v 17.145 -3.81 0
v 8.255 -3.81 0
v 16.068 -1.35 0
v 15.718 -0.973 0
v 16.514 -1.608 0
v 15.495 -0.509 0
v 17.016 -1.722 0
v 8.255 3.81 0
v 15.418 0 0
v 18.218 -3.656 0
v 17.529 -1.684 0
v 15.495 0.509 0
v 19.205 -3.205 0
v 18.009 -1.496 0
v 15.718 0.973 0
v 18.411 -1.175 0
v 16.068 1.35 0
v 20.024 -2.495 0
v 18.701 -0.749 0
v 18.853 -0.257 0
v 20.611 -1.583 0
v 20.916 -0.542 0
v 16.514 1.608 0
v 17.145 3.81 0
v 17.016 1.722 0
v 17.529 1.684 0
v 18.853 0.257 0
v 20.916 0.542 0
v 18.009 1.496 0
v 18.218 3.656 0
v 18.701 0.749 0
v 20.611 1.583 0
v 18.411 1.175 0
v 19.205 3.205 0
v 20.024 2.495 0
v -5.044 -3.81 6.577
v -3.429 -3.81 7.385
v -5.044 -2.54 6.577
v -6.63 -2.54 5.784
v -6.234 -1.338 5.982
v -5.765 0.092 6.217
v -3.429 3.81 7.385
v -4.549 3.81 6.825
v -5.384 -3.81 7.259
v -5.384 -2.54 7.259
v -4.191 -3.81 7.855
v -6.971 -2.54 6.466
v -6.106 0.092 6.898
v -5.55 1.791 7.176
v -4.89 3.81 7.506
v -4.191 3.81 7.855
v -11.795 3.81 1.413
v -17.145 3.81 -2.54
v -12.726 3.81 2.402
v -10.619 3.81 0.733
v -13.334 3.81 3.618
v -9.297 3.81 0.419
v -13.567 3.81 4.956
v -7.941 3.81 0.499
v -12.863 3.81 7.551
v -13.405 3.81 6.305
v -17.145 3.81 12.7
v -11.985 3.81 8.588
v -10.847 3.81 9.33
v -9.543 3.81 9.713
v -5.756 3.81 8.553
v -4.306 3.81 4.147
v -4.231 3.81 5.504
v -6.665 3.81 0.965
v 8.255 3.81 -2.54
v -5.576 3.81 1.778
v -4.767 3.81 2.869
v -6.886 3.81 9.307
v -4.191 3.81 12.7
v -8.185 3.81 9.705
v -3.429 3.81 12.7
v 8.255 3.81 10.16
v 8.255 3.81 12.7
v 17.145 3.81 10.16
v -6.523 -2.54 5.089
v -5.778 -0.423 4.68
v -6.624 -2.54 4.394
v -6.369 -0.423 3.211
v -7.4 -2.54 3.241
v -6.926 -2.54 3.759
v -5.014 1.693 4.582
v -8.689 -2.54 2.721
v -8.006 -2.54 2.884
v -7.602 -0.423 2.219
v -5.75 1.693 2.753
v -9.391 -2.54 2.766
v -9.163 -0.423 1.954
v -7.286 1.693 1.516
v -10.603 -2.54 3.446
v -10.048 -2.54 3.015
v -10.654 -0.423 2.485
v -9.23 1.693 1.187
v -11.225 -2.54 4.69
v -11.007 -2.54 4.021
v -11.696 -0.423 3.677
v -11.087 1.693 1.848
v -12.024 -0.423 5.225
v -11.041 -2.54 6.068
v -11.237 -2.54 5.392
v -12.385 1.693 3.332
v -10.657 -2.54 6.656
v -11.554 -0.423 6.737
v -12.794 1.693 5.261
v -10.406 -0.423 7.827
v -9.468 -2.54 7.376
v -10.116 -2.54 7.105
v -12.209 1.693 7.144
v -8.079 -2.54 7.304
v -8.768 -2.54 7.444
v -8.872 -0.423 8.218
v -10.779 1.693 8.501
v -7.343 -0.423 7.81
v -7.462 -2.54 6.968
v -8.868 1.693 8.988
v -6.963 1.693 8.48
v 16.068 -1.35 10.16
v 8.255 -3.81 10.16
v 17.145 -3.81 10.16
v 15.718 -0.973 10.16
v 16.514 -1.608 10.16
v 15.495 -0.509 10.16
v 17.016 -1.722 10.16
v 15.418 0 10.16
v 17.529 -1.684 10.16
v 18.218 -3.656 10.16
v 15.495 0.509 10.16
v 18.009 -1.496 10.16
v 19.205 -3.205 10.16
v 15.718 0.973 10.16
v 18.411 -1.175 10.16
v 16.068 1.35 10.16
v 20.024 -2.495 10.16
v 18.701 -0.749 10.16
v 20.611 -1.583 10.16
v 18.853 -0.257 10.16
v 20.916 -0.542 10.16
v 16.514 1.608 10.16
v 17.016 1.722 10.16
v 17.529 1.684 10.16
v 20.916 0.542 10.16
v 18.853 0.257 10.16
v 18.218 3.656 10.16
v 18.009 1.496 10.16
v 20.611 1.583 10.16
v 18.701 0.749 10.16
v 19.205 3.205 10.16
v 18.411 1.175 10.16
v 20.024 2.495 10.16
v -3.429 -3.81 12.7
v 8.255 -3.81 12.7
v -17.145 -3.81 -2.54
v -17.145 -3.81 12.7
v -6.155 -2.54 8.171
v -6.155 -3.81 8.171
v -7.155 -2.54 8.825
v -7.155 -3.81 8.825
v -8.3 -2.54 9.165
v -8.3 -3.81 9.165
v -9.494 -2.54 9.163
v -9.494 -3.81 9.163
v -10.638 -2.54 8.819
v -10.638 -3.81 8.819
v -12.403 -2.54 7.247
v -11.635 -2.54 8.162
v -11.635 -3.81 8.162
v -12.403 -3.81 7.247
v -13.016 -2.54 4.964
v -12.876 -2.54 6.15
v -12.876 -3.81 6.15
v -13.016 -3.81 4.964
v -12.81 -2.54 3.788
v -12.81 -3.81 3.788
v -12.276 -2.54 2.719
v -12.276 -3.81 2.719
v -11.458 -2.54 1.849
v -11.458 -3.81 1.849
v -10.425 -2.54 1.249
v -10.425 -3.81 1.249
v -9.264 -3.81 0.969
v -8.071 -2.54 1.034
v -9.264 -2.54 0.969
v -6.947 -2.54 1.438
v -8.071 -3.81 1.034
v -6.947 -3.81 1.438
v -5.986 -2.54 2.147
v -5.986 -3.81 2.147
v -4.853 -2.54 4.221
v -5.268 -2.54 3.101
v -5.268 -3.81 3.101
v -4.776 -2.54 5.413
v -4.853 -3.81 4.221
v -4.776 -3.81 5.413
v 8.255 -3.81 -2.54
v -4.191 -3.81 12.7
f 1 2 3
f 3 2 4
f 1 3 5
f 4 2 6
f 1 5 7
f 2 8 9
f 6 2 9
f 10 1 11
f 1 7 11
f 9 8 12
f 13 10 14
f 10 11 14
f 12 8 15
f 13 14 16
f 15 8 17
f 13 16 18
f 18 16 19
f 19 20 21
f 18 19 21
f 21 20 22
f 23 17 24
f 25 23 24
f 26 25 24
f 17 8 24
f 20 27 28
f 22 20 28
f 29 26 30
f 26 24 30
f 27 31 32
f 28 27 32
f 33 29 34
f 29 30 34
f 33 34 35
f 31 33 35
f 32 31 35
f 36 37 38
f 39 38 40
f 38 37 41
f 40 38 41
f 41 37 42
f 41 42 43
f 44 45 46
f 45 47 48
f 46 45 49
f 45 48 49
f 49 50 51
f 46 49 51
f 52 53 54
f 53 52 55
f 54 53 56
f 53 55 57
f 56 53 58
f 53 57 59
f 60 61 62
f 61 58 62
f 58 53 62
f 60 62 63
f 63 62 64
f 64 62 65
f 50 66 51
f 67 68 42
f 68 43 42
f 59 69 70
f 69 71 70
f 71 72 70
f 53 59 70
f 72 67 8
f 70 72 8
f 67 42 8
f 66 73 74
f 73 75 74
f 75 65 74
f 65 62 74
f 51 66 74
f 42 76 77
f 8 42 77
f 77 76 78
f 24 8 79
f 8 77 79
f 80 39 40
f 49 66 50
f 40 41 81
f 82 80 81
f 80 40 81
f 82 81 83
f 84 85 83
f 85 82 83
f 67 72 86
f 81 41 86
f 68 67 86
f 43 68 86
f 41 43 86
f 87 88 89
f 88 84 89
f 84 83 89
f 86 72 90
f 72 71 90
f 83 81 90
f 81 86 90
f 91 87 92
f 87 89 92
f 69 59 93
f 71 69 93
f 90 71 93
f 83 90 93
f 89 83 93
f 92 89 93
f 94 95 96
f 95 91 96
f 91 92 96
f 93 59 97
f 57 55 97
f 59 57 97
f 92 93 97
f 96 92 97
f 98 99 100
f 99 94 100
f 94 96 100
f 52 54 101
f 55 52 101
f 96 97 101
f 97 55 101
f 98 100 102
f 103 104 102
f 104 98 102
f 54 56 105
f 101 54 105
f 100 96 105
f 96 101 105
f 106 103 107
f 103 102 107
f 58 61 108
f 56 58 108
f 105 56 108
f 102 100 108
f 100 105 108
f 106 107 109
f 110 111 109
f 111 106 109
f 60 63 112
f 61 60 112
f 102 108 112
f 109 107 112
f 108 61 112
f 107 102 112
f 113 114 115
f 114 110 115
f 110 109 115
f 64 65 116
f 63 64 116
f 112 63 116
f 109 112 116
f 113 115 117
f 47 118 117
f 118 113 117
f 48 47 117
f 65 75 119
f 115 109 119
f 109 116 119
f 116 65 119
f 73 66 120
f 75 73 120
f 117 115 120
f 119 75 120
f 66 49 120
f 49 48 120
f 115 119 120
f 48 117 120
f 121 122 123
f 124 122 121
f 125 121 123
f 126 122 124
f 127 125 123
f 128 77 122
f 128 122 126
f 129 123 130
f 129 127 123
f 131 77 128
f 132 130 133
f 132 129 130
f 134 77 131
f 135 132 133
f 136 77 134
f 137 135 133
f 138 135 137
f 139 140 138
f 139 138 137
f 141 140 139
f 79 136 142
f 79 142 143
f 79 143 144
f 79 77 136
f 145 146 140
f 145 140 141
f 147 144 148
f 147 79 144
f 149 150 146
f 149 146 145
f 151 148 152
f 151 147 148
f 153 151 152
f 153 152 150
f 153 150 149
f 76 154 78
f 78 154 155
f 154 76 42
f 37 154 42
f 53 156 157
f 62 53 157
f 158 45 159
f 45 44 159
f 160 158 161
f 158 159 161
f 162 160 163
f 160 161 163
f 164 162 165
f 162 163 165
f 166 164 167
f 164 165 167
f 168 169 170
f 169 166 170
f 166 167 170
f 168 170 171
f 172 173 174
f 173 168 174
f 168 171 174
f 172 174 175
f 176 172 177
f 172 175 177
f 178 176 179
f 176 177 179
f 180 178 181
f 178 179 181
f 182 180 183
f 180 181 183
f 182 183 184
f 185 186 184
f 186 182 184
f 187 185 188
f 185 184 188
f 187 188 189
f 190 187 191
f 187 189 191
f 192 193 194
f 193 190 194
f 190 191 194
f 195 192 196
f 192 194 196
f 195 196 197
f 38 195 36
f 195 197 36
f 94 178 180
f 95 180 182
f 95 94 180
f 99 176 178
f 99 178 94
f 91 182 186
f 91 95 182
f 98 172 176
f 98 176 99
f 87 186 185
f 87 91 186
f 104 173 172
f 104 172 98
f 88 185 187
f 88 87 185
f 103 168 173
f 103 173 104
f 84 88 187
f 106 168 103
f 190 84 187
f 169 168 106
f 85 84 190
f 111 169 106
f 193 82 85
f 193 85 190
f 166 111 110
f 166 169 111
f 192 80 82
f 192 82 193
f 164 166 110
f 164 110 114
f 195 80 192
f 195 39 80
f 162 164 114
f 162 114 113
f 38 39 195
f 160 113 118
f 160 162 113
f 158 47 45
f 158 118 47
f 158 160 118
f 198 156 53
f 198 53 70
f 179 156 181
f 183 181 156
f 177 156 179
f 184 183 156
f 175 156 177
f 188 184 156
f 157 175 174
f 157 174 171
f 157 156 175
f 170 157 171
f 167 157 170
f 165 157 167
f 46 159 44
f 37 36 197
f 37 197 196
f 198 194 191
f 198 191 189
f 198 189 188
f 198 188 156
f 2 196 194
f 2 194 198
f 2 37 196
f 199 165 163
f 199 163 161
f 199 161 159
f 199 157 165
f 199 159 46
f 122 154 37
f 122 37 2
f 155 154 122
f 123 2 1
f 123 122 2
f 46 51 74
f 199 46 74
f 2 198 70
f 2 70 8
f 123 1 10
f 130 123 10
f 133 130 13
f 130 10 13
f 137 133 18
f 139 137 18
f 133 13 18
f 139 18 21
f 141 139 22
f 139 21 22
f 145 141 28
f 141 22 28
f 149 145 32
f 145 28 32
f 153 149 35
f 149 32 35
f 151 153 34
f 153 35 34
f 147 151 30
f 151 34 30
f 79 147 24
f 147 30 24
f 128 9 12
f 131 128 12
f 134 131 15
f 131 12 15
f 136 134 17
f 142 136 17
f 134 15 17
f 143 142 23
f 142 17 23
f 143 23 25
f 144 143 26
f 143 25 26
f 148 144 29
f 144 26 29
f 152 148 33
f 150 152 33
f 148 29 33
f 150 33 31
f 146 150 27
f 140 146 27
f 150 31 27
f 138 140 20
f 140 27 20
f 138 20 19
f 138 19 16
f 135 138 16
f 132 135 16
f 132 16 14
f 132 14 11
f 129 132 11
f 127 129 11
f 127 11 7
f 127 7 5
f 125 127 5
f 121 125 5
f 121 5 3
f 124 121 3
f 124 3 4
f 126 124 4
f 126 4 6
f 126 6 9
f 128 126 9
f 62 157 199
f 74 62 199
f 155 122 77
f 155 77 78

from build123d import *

# Parameters (mm, degrees)
BOSS_EXTRUDE1_DEPTH   = 10.16
F_4_CLEARANCE_HOLE1_D = 3.4544
SKETCH4_R             = 1.905
CUT_EXTRUDE1_DEPTH    = 8.62
CUT_EXTRUDE1_TAPER    = -20
SKETCH5_R             = 4.1275
CUT_EXTRUDE2_DEPTH    = 1.27
SKETCH6_W             = 25.4
SKETCH6_H             = 2.54
BOSS_EXTRUDE2_DEPTH   = 7.62
CUT_EXTRUDE3_DEPTH    = 8.62


with BuildPart() as part:
    # Sketch1 → Boss-Extrude1 (new body)
    with BuildSketch(Plane.XY):
        with BuildLine():
            Line((-17.145, -3.81), (17.145, -3.81))
            ThreePointArc((17.145, -3.81), (20.955, 0), (17.145, 3.81))
            Line((17.145, 3.81), (-17.145, 3.81))
            Line((-17.145, 3.81), (-17.145, -3.81))
        make_face()
    extrude(amount=BOSS_EXTRUDE1_DEPTH)

    # #4 Clearance Hole1 (through all)
    with Locations(Plane.XY.offset(10.16)):
        with Locations((17.145, 0)):
            Hole(F_4_CLEARANCE_HOLE1_D / 2)

    # Sketch4 → Cut-Extrude1 (cut, through all)
    with BuildSketch(Plane(origin=(0, -3.81, 0), x_dir=(1, 0, 0), z_dir=(0, 1, 0))):
        with Locations((-8.89, -5.08)):
            Circle(SKETCH4_R)
    extrude(amount=CUT_EXTRUDE1_DEPTH, taper=CUT_EXTRUDE1_TAPER, mode=Mode.SUBTRACT)

    # Sketch5 → Cut-Extrude2 (cut)
    with BuildSketch(Plane.XZ.offset(3.81)):
        with Locations((-8.89, 5.08)):
            Circle(SKETCH5_R)
    extrude(amount=-CUT_EXTRUDE2_DEPTH, mode=Mode.SUBTRACT)

    # Sketch6 → Boss-Extrude2 (add, through all)
    with BuildSketch(Plane.XZ.offset(3.81)):
        with Locations((-4.445, 11.43)):
            Rectangle(SKETCH6_W, SKETCH6_H)
        with Locations((-4.445, -1.27)):
            Rectangle(SKETCH6_W, SKETCH6_H)
    extrude(amount=-BOSS_EXTRUDE2_DEPTH)

    # Sketch8 → Cut-Extrude3 (cut, through all)
    with BuildSketch(Plane(origin=(0, 3.81, 0), x_dir=(1, 0, 0), z_dir=(0, 1, 0))):
        Polygon((-3.429, -12.7), (-3.429, -7.38452905), (-8.71961162, -4.73922324), (-9.06038838, -5.42077676), (-4.191, -7.85547095), (-4.191, -12.7), align=None)
    extrude(amount=-CUT_EXTRUDE3_DEPTH, mode=Mode.SUBTRACT)


solid = part.part
